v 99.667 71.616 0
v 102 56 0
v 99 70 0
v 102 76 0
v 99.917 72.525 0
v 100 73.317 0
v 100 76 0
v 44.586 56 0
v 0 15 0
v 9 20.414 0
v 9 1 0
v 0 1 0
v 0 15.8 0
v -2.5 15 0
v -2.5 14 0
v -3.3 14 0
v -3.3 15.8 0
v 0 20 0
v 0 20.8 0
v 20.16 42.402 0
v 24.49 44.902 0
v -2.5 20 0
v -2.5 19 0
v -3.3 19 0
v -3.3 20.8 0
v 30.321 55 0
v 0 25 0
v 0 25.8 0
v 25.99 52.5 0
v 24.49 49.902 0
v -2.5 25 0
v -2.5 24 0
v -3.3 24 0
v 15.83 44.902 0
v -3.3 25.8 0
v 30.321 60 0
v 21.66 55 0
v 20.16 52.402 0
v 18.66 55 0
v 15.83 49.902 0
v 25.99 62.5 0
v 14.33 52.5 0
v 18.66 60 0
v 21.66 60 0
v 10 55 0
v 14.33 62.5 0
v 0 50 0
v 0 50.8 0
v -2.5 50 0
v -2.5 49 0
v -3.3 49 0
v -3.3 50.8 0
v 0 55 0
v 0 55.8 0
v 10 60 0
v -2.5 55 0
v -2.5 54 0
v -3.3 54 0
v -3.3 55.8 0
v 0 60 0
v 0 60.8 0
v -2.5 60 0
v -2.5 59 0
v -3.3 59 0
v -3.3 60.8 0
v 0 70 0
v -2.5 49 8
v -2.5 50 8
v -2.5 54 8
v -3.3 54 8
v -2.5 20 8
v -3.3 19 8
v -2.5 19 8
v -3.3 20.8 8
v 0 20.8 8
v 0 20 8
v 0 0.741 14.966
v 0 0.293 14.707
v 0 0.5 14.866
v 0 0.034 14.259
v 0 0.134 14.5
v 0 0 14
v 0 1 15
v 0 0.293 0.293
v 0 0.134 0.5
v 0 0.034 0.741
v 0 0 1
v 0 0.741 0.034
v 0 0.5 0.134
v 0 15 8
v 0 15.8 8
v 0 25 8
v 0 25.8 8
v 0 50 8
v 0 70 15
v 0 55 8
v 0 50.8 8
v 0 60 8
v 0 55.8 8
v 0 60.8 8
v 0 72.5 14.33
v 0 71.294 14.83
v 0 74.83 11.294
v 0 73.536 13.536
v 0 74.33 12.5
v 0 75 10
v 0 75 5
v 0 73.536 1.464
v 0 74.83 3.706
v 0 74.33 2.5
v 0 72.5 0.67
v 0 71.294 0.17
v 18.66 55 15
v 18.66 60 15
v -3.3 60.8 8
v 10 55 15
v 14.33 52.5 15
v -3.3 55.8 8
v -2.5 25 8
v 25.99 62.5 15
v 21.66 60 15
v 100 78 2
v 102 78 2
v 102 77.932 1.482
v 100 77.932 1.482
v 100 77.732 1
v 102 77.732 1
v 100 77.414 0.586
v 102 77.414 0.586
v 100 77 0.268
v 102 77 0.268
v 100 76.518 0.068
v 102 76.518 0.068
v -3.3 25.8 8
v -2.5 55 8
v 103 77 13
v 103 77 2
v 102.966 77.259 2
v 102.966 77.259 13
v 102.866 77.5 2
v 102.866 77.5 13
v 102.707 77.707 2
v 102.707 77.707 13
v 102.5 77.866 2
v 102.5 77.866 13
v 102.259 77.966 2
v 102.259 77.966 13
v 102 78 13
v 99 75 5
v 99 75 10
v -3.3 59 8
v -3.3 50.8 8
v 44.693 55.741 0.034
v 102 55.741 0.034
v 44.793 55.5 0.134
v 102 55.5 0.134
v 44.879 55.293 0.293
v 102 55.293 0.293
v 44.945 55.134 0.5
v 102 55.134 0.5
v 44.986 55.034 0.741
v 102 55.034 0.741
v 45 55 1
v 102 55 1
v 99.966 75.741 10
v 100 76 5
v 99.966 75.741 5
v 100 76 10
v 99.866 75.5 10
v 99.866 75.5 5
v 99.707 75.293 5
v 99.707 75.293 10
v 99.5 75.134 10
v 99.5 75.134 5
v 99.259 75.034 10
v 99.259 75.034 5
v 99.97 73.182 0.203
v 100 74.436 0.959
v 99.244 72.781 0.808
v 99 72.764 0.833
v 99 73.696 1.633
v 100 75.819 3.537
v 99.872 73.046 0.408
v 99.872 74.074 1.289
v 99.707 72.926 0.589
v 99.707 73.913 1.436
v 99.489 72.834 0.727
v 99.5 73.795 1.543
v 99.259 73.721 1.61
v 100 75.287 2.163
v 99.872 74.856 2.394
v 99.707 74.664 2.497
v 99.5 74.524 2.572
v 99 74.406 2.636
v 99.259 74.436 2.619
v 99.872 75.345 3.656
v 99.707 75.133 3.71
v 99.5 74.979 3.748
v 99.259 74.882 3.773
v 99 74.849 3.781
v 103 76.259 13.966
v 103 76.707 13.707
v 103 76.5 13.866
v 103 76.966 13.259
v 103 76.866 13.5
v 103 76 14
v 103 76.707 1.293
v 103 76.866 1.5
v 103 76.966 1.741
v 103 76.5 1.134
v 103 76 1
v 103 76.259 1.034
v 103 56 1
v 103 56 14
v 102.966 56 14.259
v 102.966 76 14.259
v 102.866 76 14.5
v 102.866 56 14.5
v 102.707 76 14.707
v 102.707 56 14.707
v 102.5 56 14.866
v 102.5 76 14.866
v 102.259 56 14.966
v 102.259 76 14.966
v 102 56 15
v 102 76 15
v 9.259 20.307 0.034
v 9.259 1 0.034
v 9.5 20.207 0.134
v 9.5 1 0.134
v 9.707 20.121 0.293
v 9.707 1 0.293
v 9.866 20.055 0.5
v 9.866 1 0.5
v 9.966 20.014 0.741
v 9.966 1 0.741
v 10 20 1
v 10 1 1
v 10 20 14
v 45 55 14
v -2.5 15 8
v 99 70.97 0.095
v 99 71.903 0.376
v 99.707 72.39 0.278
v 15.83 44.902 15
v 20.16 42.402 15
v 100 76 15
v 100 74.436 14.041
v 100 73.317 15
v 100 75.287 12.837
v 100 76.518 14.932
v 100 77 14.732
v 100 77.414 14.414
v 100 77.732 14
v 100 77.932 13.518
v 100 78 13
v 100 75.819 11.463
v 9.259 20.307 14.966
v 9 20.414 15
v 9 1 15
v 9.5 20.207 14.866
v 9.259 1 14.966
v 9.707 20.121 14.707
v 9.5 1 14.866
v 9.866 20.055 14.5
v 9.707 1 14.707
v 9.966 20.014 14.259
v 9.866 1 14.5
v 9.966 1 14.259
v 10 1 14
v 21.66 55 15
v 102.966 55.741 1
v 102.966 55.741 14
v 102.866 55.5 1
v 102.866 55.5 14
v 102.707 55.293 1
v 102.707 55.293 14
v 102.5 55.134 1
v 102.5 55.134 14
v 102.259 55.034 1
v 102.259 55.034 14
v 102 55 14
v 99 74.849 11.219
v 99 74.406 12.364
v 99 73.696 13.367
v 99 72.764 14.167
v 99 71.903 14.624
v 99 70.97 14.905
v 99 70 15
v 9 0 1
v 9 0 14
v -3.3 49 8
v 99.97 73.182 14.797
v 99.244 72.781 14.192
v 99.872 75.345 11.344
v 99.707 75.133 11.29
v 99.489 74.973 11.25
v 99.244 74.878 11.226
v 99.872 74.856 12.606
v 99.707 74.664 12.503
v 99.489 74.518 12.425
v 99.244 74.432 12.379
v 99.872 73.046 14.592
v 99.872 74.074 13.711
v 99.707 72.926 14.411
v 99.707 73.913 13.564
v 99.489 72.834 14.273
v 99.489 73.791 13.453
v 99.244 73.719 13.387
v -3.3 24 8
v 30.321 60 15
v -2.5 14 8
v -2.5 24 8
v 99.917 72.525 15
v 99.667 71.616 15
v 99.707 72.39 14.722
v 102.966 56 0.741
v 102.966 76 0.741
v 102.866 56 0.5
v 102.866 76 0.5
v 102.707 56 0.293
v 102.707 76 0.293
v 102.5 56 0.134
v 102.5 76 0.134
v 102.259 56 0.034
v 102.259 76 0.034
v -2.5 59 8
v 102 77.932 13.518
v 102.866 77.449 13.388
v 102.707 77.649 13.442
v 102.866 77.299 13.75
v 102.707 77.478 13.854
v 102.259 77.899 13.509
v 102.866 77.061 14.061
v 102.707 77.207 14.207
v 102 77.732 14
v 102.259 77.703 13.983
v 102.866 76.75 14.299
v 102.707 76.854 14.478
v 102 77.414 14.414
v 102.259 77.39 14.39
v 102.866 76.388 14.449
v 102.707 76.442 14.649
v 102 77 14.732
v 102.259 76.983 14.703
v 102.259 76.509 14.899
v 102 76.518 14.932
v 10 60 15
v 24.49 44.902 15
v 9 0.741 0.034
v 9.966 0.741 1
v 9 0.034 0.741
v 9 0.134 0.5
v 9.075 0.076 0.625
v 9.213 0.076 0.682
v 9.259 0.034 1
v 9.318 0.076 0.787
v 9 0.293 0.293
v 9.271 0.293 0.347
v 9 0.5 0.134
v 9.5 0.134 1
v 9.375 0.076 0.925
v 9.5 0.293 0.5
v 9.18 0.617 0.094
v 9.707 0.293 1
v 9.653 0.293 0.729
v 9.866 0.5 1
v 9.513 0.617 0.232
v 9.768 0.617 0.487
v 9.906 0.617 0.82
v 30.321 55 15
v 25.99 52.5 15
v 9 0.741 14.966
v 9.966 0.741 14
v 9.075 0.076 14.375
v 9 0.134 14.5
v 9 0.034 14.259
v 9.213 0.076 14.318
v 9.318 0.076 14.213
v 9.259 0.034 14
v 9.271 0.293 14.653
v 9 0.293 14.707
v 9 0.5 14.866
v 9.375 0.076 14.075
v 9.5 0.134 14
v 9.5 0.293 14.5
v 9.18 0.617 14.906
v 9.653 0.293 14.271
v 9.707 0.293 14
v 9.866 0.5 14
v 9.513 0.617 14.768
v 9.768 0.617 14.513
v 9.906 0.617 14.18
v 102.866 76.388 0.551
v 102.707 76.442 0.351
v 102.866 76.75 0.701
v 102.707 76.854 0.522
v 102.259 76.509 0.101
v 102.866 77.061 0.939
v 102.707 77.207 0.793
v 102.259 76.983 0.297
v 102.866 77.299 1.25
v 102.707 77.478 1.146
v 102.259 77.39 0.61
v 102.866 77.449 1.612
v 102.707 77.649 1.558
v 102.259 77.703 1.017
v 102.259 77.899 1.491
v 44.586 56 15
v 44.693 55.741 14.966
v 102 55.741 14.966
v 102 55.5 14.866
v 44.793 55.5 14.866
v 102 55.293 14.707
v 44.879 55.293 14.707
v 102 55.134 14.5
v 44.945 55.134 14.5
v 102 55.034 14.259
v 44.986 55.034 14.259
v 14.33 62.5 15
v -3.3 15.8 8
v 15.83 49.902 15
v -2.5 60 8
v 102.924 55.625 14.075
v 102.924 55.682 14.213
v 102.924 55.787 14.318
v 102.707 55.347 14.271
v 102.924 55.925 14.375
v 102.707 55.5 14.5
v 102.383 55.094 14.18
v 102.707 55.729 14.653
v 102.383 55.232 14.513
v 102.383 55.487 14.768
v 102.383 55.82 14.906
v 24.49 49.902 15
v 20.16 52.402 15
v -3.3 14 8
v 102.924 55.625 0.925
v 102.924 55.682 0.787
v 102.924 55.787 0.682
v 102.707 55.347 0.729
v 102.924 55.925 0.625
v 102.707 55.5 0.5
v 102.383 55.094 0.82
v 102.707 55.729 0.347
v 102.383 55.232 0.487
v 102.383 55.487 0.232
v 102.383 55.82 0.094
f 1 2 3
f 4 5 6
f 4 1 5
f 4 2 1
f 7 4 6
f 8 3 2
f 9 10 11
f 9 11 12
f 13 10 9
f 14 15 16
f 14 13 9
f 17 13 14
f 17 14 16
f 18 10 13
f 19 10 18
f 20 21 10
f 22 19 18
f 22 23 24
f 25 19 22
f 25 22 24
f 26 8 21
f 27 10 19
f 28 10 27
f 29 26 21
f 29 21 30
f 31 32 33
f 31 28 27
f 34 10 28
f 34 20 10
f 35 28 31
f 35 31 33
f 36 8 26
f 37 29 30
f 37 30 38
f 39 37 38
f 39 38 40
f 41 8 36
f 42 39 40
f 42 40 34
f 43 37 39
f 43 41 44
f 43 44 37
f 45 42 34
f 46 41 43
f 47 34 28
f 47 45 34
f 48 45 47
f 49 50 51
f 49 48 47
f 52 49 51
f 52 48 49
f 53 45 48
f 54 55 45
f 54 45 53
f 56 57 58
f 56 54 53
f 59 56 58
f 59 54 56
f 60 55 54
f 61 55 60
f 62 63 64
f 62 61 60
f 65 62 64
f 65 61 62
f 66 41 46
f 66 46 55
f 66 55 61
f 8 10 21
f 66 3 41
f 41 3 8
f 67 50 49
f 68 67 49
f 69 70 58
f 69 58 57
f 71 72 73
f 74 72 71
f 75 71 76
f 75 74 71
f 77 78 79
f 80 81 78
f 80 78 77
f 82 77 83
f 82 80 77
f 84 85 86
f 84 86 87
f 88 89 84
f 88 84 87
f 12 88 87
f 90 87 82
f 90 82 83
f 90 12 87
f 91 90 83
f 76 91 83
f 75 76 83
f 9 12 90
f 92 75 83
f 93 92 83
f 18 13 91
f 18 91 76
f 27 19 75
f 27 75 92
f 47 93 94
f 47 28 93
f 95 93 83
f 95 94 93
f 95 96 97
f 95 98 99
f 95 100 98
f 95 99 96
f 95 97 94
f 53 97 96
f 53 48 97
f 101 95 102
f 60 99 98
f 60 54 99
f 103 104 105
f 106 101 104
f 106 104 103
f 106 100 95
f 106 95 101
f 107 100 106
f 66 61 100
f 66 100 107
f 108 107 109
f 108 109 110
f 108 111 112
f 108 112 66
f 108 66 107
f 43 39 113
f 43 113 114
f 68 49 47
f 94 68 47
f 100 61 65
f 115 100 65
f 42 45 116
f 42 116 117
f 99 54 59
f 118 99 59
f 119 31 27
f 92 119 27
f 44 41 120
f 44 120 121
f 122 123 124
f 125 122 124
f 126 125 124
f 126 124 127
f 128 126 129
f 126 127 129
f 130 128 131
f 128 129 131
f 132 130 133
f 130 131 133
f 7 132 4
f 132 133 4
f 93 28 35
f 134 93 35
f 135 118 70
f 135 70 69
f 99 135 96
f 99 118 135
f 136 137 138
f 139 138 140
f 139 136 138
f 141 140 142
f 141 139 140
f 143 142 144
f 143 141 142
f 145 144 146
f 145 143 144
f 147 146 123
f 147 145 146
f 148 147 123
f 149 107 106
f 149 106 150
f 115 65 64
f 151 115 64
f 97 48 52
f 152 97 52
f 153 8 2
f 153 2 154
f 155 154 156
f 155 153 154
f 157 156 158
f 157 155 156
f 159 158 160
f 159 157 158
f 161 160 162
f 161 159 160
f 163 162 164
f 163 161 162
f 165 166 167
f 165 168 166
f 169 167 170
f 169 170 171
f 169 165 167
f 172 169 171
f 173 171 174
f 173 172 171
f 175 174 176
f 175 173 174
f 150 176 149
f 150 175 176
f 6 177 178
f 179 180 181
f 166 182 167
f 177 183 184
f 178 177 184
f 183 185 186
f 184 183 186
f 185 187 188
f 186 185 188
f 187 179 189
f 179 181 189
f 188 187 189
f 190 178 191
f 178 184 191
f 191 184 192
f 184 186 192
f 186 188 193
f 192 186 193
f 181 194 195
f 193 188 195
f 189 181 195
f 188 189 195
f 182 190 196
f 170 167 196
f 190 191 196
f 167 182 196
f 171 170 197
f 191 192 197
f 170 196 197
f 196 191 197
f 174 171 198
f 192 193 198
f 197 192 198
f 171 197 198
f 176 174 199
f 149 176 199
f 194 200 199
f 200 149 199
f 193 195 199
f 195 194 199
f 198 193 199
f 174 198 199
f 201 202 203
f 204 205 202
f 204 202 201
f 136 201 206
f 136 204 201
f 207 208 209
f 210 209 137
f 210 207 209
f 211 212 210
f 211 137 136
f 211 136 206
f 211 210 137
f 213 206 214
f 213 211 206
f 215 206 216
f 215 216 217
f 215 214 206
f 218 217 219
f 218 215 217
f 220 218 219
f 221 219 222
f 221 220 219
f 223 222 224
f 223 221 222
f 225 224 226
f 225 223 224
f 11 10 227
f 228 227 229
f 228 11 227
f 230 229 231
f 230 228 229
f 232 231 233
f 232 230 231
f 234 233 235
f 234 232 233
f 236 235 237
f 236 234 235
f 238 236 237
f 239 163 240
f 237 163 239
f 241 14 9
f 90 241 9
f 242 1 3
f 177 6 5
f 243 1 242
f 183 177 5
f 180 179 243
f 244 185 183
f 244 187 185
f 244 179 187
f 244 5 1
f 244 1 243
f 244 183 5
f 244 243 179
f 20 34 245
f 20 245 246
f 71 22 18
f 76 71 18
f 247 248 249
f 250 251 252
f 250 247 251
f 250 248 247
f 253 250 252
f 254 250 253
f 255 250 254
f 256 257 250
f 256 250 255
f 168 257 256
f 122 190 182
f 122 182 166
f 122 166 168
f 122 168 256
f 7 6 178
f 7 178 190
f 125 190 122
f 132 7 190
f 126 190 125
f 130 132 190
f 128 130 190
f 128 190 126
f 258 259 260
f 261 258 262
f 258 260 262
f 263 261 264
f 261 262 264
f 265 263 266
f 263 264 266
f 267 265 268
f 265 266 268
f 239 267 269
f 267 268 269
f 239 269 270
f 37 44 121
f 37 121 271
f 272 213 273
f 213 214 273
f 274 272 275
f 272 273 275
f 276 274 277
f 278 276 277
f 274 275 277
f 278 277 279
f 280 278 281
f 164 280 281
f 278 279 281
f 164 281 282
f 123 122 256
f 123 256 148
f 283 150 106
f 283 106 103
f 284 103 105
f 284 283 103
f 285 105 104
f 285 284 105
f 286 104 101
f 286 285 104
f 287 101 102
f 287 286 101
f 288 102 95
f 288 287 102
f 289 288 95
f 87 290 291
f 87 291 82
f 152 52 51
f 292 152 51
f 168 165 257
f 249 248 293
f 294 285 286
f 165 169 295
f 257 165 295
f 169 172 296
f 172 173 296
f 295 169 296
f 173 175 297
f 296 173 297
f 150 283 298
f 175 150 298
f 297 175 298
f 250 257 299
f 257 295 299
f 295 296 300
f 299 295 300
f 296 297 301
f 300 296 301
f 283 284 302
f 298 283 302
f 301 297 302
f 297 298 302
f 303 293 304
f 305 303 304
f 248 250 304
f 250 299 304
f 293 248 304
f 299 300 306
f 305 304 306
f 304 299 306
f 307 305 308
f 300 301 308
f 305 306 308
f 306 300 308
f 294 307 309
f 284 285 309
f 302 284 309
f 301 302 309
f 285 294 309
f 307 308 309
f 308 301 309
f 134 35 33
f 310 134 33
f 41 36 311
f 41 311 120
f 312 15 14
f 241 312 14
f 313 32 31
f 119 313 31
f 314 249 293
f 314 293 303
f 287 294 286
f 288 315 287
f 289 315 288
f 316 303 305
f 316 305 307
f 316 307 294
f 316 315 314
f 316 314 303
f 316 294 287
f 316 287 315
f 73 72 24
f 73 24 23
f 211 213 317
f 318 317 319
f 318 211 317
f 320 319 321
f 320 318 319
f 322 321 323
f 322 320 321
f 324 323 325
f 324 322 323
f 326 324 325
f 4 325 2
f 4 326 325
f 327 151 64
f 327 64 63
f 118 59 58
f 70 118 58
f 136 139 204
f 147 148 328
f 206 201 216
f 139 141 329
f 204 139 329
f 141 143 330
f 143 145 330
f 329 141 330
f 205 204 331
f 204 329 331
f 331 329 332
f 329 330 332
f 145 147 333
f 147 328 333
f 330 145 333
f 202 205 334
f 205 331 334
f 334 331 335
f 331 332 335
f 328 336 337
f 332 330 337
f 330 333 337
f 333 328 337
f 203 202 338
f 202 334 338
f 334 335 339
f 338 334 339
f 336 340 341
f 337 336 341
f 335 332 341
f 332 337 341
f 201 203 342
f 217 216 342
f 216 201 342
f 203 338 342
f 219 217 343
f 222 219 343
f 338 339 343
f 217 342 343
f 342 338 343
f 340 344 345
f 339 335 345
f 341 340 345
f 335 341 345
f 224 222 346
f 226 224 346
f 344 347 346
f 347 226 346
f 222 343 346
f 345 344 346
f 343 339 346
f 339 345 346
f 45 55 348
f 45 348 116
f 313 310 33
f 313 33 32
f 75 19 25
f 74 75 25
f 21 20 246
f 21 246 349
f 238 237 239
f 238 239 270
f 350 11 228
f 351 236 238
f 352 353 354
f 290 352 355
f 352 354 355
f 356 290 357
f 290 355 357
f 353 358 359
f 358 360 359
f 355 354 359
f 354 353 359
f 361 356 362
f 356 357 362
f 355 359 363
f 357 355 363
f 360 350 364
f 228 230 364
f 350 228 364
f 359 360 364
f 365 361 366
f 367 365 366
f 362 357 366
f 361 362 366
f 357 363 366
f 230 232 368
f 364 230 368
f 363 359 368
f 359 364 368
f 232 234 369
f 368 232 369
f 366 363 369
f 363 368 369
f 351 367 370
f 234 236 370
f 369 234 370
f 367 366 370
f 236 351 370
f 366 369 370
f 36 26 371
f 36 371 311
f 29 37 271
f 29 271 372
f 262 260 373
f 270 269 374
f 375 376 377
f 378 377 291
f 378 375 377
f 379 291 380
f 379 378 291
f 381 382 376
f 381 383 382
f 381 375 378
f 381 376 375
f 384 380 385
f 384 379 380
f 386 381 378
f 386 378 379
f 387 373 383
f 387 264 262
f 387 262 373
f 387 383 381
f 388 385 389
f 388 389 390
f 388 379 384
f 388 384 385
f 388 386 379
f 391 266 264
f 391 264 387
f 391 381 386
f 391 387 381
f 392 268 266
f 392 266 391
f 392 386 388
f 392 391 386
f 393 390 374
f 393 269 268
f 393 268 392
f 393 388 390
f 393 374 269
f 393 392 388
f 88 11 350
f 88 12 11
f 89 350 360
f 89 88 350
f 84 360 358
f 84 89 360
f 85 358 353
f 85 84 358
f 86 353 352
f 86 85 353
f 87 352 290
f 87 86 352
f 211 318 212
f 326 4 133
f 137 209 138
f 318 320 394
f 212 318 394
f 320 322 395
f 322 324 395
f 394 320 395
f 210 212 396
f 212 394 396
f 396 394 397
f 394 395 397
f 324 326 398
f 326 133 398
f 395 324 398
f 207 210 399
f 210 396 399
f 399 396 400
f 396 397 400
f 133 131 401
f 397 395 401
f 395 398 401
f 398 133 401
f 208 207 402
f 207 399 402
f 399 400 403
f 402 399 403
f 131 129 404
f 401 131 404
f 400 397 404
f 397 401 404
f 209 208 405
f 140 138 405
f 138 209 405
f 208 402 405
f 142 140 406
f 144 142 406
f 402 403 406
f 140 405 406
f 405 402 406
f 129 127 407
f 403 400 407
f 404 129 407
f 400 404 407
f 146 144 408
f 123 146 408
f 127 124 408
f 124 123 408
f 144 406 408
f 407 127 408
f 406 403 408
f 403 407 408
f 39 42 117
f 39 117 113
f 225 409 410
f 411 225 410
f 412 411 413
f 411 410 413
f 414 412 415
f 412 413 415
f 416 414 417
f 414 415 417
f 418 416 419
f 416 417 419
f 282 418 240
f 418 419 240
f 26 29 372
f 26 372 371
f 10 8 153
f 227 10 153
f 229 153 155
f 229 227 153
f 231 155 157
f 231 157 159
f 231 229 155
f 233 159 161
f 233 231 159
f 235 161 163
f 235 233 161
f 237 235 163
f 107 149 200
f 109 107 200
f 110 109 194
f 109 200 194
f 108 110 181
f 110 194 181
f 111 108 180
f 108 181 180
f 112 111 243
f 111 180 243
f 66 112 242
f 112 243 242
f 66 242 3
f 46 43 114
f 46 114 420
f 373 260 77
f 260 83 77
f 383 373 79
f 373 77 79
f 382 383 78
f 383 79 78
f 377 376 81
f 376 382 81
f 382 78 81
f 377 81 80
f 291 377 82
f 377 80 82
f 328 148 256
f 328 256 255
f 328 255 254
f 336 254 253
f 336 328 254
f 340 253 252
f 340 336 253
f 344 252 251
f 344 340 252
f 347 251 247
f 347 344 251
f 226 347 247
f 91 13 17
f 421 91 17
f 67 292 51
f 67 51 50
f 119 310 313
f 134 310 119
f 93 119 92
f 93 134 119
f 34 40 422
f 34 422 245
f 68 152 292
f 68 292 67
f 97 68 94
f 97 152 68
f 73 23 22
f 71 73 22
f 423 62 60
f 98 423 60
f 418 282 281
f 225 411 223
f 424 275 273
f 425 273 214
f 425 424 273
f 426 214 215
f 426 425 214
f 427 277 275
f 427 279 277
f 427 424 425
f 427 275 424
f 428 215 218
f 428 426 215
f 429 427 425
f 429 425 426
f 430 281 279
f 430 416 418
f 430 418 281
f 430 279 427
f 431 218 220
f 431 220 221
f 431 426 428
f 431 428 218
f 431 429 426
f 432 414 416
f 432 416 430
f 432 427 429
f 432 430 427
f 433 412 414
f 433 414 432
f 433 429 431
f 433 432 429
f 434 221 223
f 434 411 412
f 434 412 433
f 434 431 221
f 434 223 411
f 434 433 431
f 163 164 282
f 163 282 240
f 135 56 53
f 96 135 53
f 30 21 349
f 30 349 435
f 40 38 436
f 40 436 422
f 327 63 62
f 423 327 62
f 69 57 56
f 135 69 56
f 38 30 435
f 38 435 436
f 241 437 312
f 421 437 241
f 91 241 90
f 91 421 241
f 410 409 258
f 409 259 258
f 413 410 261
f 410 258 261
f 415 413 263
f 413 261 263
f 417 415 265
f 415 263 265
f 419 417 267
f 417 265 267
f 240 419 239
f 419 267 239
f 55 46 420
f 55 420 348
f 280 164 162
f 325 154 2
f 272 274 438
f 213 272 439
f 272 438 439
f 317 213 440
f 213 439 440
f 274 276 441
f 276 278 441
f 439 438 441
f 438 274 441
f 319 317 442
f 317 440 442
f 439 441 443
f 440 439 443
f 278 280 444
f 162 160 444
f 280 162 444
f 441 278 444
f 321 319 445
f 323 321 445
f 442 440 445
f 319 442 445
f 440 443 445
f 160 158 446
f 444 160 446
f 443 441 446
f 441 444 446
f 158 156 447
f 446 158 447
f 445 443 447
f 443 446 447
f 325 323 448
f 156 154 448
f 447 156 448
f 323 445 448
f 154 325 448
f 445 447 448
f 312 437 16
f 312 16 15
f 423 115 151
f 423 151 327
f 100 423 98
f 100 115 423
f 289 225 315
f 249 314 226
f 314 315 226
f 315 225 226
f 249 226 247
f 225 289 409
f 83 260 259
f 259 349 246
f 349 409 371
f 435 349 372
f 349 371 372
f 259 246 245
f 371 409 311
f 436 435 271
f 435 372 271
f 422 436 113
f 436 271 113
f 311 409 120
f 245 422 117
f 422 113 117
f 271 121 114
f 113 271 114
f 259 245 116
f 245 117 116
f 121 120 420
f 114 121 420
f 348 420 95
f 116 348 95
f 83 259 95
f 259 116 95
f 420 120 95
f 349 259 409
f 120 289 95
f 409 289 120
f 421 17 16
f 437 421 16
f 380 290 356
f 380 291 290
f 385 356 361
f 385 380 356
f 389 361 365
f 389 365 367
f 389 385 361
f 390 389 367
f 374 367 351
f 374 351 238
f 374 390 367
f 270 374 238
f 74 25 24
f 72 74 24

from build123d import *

# Parameters (mm, degrees)
PAD_DEPTH    = 15
FILLET_R     = 5
FILLET001_R  = 2
FILLET002_R  = 1
FILLET003_R  = 1
PAD001_DEPTH = 8


with BuildPart() as part:
    # Sketch → Pad (new body)
    with BuildSketch(Plane.XY):
        Polygon((0, 0), (0, 75), (100, 75), (100, 78), (103, 78), (103, 55), (45, 55), (10, 20), (10, 0), align=None)
        Polygon((18.660254, 55), (18.660254, 60), (14.330127, 62.5), (10, 60), (10, 55), (14.330127, 52.5), align=None, mode=Mode.SUBTRACT)
        Polygon((24.490381, 44.901924), (24.490381, 49.901924), (20.160254, 52.401924), (15.830127, 49.901924), (15.830127, 44.901924), (20.160254, 42.401924), align=None, mode=Mode.SUBTRACT)
        Polygon((30.320508, 55), (30.320508, 60), (25.990381, 62.5), (21.660254, 60), (21.660254, 55), (25.990381, 52.5), align=None, mode=Mode.SUBTRACT)
    extrude(amount=PAD_DEPTH)

    # Fillet
    fillet_edges = [part.edges().sort_by_distance(p)[0] for p in [
        (50, 75, 15),
        (50, 75, 0),
    ]]
    fillet(fillet_edges, radius=FILLET_R)

    # Fillet001
    fillet001_edges = [part.edges().sort_by_distance(p)[0] for p in [
        (101.5, 78, 15),
        (101.5, 78, 0),
    ]]
    fillet(fillet001_edges, radius=FILLET001_R)

    # Fillet002
    fillet002_edges = [part.edges().sort_by_distance(p)[0] for p in [
        (10, 10, 15),
        (27.5, 37.5, 15),
        (27.5, 37.5, 0),
        (10, 10, 0),
        (74, 55, 15),
        (74, 55, 0),
        (103, 55, 7.5),
        (5, 0, 15),
        (5, 0, 0),
        (10, 0, 7.5),
        (103, 65.5, 15),
        (103, 65.5, 0),
        (103, 78, 7.5),
        (103, 77.414214, 14.414214),
        (103, 77.414214, 0.585786),
    ]]
    fillet(fillet002_edges, radius=FILLET002_R)

    # Fillet003
    fillet003_edges = [part.edges().sort_by_distance(p)[0] for p in [
        (100, 73.535534, 13.535534),
        (100, 75, 7.5),
        (100, 73.535534, 1.464466),
    ]]
    fillet(fillet003_edges, radius=FILLET003_R)

    # Sketch003 → Pad001 (join)
    with BuildSketch(Plane.XY):
        Polygon((0, 60.8), (-3.3, 60.8), (-3.3, 59), (-2.5, 59), (-2.5, 60), (0, 60), align=None)
        Polygon((0, 55), (0, 55.8), (-3.3, 55.8), (-3.3, 54), (-2.5, 54), (-2.5, 55), align=None)
        Polygon((0, 50.8), (-3.3, 50.8), (-3.3, 49), (-2.5, 49), (-2.5, 50), (0, 50), align=None)
        Polygon((0, 25.8), (-3.3, 25.8), (-3.3, 24), (-2.5, 24), (-2.5, 25), (0, 25), align=None)
        Polygon((0, 20.8), (-3.3, 20.8), (-3.3, 19), (-2.5, 19), (-2.5, 20), (0, 20), align=None)
        Polygon((0, 15.8), (-3.3, 15.8), (-3.3, 14), (-2.5, 14), (-2.5, 15), (0, 15), align=None)
    extrude(amount=PAD001_DEPTH)


solid = part.part
